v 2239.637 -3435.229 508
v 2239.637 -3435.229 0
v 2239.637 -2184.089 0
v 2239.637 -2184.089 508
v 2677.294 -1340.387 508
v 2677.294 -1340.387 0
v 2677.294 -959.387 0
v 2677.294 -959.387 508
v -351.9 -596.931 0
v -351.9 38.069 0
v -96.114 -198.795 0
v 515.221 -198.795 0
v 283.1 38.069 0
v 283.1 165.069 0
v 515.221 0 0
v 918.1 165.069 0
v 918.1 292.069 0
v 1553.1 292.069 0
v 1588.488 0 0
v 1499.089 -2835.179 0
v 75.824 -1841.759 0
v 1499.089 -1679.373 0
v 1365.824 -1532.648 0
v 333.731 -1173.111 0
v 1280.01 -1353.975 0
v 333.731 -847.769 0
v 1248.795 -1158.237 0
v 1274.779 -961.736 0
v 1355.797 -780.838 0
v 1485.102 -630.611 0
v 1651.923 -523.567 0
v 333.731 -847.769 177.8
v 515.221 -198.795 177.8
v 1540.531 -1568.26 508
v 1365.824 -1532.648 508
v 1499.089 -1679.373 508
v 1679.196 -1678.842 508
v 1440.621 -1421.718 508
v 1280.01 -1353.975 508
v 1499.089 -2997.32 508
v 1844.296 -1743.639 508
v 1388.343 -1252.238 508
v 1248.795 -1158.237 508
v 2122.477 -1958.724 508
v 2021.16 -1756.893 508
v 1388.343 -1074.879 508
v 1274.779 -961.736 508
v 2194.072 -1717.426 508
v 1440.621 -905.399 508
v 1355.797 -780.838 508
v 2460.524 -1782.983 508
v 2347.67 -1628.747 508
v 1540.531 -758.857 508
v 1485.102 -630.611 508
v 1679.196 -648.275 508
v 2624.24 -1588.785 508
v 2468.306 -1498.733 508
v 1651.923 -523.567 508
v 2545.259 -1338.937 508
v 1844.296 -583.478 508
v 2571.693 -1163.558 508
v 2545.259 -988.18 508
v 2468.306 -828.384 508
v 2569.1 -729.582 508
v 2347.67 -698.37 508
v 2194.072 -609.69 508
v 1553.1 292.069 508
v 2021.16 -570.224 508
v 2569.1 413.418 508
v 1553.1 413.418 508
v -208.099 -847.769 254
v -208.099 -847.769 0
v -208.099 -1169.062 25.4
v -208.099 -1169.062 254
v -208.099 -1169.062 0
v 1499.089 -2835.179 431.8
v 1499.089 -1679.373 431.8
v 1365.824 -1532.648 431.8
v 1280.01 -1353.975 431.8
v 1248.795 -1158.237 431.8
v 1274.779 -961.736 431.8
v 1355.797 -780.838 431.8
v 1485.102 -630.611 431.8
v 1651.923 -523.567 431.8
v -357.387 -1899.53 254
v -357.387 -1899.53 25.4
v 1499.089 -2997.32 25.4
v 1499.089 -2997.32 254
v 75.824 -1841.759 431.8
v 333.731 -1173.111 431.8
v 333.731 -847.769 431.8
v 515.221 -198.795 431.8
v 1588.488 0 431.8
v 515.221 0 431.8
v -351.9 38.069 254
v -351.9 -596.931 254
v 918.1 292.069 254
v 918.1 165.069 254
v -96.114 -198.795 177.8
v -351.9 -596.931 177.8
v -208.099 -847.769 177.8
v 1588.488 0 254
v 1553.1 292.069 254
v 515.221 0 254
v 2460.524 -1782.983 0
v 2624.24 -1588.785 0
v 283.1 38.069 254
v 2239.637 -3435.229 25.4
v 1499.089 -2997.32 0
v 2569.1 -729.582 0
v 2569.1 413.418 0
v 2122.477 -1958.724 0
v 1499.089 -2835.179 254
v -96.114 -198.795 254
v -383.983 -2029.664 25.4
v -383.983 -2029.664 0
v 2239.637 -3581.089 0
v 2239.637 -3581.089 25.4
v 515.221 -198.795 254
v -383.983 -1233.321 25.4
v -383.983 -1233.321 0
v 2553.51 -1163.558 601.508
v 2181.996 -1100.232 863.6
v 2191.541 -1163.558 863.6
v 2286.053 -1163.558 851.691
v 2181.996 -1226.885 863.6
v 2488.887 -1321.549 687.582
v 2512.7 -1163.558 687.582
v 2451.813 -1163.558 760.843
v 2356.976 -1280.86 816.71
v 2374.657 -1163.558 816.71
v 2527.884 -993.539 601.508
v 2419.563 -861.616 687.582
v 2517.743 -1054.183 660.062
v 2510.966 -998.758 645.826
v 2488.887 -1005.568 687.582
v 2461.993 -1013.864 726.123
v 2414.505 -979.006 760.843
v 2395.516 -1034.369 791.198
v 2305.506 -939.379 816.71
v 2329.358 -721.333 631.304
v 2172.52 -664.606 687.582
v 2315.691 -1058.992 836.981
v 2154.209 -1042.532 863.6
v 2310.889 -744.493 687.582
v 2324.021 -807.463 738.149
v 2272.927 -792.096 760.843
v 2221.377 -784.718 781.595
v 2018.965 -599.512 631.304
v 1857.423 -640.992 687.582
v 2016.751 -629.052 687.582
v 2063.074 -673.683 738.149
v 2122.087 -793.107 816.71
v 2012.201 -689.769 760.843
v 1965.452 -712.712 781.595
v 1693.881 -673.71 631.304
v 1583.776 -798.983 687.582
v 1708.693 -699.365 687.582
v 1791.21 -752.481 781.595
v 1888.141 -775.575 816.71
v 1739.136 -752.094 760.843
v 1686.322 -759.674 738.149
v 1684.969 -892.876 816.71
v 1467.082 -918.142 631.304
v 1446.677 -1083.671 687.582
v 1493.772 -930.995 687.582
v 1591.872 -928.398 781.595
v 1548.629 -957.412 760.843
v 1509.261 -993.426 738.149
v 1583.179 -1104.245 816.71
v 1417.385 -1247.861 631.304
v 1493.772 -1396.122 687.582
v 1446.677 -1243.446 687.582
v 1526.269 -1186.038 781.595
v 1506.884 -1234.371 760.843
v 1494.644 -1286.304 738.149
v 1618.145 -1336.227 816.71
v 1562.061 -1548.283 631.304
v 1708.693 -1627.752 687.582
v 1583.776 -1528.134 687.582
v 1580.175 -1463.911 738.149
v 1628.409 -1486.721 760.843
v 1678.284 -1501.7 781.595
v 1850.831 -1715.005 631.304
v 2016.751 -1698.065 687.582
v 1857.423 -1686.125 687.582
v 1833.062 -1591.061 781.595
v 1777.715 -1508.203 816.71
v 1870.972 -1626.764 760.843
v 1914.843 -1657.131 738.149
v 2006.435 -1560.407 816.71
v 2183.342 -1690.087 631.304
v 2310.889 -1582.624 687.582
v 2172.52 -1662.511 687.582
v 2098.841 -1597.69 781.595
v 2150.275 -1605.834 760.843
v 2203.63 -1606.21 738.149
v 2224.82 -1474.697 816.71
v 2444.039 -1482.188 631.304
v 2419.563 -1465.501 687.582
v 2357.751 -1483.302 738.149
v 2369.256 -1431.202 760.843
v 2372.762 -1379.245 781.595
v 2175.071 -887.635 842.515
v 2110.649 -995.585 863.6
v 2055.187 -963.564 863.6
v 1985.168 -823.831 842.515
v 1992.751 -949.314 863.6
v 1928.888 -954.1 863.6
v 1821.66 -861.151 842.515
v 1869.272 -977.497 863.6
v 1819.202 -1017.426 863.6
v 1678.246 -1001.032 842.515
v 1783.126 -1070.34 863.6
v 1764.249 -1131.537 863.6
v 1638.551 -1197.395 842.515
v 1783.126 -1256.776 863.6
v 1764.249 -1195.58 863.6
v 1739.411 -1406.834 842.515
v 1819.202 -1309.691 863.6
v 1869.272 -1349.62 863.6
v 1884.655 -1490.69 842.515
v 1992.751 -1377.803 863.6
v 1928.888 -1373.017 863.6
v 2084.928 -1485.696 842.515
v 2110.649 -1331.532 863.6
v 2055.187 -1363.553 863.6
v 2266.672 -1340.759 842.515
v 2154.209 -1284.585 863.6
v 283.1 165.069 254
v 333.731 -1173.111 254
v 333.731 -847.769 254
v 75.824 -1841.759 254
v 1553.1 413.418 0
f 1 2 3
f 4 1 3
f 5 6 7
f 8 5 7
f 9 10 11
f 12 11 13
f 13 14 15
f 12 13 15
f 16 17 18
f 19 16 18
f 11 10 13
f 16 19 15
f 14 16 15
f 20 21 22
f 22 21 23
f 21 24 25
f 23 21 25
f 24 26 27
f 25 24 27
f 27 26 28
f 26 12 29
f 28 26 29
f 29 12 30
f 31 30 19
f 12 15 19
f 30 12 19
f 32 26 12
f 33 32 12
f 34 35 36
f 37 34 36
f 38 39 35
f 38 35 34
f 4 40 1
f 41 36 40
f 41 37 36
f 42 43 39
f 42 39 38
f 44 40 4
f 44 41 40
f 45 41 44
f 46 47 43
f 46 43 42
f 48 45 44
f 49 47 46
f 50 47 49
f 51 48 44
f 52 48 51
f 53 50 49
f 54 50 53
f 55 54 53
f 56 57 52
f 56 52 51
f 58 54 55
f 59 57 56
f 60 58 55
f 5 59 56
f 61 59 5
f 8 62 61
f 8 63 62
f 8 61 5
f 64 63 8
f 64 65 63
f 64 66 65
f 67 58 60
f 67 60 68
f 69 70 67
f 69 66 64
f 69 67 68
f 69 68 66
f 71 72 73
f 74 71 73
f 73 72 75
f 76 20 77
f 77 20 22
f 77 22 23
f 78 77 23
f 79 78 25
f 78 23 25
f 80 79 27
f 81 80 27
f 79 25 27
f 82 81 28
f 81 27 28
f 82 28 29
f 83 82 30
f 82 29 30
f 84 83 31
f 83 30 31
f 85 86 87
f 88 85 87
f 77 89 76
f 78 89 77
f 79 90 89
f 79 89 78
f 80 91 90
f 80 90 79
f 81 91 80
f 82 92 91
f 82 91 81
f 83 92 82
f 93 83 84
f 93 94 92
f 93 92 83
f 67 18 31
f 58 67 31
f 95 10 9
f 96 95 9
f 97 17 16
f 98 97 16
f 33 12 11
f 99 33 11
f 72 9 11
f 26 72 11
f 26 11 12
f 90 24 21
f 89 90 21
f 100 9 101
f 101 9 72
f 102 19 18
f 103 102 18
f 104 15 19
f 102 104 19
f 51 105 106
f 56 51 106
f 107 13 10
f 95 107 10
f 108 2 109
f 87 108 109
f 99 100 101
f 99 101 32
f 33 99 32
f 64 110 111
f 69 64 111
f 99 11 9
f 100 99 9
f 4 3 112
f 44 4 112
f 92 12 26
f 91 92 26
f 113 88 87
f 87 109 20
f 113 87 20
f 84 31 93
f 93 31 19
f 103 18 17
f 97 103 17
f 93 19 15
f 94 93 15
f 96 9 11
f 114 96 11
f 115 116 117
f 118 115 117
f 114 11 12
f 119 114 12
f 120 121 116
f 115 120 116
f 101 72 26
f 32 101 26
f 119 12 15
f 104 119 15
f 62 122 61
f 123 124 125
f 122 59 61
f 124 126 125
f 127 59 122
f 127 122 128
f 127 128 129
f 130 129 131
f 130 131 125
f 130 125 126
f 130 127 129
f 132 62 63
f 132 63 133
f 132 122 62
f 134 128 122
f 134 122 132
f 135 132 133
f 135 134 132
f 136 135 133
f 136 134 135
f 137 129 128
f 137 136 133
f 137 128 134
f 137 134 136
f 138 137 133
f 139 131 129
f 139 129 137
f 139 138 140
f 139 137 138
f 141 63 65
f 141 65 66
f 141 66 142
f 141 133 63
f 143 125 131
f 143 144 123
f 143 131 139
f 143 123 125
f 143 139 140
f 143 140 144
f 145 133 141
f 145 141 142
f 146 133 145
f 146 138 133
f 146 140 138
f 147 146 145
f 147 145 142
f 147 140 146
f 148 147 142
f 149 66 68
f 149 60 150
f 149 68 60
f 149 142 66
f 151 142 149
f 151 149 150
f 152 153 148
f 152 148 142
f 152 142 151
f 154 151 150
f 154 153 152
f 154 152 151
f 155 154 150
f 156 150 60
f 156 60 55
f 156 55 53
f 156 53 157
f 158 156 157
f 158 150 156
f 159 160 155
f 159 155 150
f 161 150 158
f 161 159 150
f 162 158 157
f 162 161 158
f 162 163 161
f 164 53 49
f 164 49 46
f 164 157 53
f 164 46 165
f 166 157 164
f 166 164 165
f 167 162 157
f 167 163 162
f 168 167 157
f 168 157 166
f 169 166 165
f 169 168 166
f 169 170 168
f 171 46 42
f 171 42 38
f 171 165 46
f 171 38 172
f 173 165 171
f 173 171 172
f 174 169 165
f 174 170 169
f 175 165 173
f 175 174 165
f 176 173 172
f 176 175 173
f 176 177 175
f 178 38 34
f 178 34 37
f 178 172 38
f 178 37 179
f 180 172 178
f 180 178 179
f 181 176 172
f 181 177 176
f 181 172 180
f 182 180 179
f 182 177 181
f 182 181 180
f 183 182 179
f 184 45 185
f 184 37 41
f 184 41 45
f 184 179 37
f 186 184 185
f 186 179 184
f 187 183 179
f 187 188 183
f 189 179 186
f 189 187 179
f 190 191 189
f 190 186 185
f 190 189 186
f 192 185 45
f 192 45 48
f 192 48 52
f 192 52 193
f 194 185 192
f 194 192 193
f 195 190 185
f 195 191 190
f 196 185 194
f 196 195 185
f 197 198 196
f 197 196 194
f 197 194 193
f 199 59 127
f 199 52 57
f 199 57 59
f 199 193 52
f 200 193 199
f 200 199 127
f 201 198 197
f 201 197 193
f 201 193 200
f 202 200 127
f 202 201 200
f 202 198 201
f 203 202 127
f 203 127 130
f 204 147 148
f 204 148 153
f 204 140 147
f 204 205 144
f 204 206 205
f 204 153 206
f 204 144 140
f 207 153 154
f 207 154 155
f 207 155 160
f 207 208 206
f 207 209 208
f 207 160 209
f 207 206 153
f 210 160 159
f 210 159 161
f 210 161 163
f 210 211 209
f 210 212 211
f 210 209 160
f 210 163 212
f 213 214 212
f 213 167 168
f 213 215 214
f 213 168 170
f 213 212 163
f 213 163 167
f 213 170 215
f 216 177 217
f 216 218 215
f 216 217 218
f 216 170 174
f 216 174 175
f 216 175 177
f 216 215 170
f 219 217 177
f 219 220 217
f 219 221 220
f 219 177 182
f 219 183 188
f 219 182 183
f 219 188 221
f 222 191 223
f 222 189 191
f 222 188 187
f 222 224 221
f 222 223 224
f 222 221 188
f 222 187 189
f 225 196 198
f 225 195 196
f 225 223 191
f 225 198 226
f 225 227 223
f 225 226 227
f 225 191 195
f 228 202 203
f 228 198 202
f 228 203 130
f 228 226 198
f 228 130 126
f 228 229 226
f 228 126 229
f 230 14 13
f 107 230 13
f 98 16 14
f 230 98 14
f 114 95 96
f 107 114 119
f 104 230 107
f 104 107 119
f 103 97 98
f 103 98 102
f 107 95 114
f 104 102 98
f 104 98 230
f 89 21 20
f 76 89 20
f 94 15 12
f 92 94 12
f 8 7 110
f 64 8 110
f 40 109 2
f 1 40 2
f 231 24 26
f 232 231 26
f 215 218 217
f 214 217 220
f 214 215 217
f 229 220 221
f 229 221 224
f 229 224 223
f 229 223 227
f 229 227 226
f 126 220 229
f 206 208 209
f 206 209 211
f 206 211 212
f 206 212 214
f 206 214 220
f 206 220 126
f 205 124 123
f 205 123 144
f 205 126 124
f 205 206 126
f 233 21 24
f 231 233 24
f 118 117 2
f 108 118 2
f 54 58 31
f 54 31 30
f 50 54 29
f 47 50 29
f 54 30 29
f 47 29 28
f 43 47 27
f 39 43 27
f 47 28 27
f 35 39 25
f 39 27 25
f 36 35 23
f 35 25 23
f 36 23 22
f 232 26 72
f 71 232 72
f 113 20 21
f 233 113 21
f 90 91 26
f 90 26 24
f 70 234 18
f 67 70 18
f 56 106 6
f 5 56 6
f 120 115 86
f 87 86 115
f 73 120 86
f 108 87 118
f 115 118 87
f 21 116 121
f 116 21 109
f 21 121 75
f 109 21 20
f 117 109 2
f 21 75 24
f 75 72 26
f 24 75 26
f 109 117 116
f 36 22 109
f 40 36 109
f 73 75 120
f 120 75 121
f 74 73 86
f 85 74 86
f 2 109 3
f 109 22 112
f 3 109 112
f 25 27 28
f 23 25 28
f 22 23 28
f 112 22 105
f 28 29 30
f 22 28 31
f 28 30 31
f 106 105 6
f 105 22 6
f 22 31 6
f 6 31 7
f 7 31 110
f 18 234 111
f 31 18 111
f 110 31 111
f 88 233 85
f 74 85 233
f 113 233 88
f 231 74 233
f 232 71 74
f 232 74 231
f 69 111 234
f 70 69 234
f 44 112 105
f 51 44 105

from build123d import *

# Parameters (mm, degrees)
F1_DEPTH = 25.4
F2_DEPTH = 254
F3_DEPTH = 177.8
F4_DEPTH = 431.8
F0_R     = 594.9979970548
F5_DEPTH = 508
F6_DEPTH = 863.6


# Not quite as in the source:
# - a fillet or chamfer that OpenCascade refuses, or shapes differently, is made with other operations: its cross-section is extruded or revolved along the edge and cut away or added


with BuildPart() as f1:
    # F0 (on Top) → F1 (new body)
    with BuildSketch(Plane.XY):
        Polygon((2239.6372437481, -3435.2285861969), (1499.0893602371, -2997.3202280322), (1499.0893602371, -3143.1810455656), (2239.6372437481, -3581.0894037303), align=None)
        Polygon((-357.3869134164, -1899.5296663834), (-208.0992609262, -1169.0624952316), (-383.9827477932, -1233.3211898804), (-383.9827477932, -2029.6635627747), align=None)
        Polygon((1499.0893602371, -2997.3202280322), (-357.3869134164, -1899.5296663834), (-383.9827477932, -2029.6635627747), (1499.0893602371, -3143.1810455656), align=None)
    extrude(amount=F1_DEPTH)

    # F0 (on Top) → F2 (join)
    with BuildSketch(Plane.XY):
        Polygon((333.7312042713, -847.7689027786), (-208.0992609262, -847.7689027786), (-208.0992609262, -1169.0624952316), (-357.3869134164, -1899.5296663834), (1499.0893602371, -2997.3202280322), (1499.0893602371, -2835.1788520813), (75.824059546, -1841.7588472366), (333.7312042713, -1173.1106042862), align=None)
    extrude(amount=F2_DEPTH)


with BuildPart() as f2:
    # F0 (on Top) → F2, piece 2 (new body)
    with BuildSketch(Plane.XY):
        Polygon((283.1003940614, 38.0688405037), (-351.8996059386, 38.0688405037), (-351.8996059386, -596.9311594963), (-96.1140394211, -198.7948268652), (515.2214169502, -198.7948268652), (515.2214169502, 0), (1588.4876312045, 0), (1553.1003940614, 292.0688405037), (918.1003940614, 292.0688405037), (918.1003940614, 165.0688405037), (283.1003940614, 165.0688405037), align=None)
    extrude(amount=F2_DEPTH)


with BuildPart() as f3:
    # F0 (on Top) → F3 (new body)
    with BuildSketch(Plane.XY):
        Polygon((-96.1140394211, -198.7948268652), (-351.8996059386, -596.9311594963), (-208.0992609262, -847.7689027786), (333.7312042713, -847.7689027786), (515.2214169502, -198.7948268652), align=None)
    extrude(amount=F3_DEPTH)


with BuildPart() as f4:
    # F0 (on Top) → F4 (new body)
    with BuildSketch(Plane.XY):
        with BuildLine():
            Line((515.2214169502, -198.7948268652), (333.7312042713, -847.7689027786))
            Line((333.7312042713, -847.7689027786), (333.7312042713, -1173.1106042862))
            Line((333.7312042713, -1173.1106042862), (75.824059546, -1841.7588472366))
            Line((75.824059546, -1841.7588472366), (1499.0893602371, -2835.1788520813))
            Line((1499.0893602371, -2835.1788520813), (1499.0893602371, -1679.3727874756))
            ThreePointArc((1499.0893602371, -1679.3727874756), (1254.6606819019, -1059.0438901467), (1651.9232988358, -523.5667824745))
            Line((1651.9232988358, -523.5667824745), (1588.4876312045, 0))
            Line((1588.4876312045, 0), (515.2214169502, 0))
            Line((515.2214169502, 0), (515.2214169502, -198.7948268652))
        make_face()
    extrude(amount=F4_DEPTH)


with BuildPart() as f5:
    # F0 (on Top) → F5 (new body)
    with BuildSketch(Plane.XY):
        with BuildLine():
            Line((1553.1003940614, 413.4177421996), (1553.1003940614, 292.0688405037))
            Line((1553.1003940614, 292.0688405037), (1588.4876312045, 0))
            Line((1588.4876312045, 0), (1651.9232988358, -523.5667824745))
            ThreePointArc((1651.9232988358, -523.5667824745), (1254.6606819019, -1059.0438901467), (1499.0893602371, -1679.3727874756))
            Line((1499.0893602371, -1679.3727874756), (1499.0893602371, -2835.1788520813))
            Line((1499.0893602371, -2835.1788520813), (1499.0893602371, -2997.3202280322))
            Line((1499.0893602371, -2997.3202280322), (2239.6372437481, -3435.2285861969))
            Line((2239.6372437481, -3435.2285861969), (2239.6372437481, -2184.0894037303))
            Line((2239.6372437481, -2184.0894037303), (2122.4766519932, -1958.7243759651))
            Line((2122.4766519932, -1958.7243759651), (2460.5241936411, -1782.9834883327))
            Line((2460.5241936411, -1782.9834883327), (2624.2396669257, -1588.7845083992))
            Line((2624.2396669257, -1588.7845083992), (2677.2935103517, -1340.3870653815))
            Line((2677.2935103517, -1340.3870653815), (2677.2935103517, -959.3870653815))
            Line((2677.2935103517, -959.3870653815), (2569.1003940614, -729.5822578004))
            Line((2569.1003940614, -729.5822578004), (2569.1003940614, 413.4177421996))
            Line((2569.1003940614, 413.4177421996), (1553.1003940614, 413.4177421996))
        make_face()
        with Locations((1976.6952991486, -1163.5584831238)):
            Circle(F0_R, mode=Mode.SUBTRACT)
    extrude(amount=F5_DEPTH)

    # F0 (on Top) → F6 (join)
    with BuildSketch(Plane.XY):
        with Locations((1976.6952991486, -1163.5584831238)):
            Circle(F0_R)
    extrude(amount=F6_DEPTH)

    # F7: fillet of radius 381 on 1 edges, made by hand

    # F7_s1 → F7_t2 (revolve, cut)
    with BuildSketch(Plane.XZ.offset(1163.5584831238)):
        with BuildLine():
            ThreePointArc((2571.6932962034, 508), (2451.8134551625, 760.8430592126), (2191.5409057072, 863.6))
            Line((2191.5409057072, 863.6), (2571.6932962034, 863.6))
            Line((2571.6932962034, 863.6), (2571.6932962034, 508))
        make_face()
    revolve(axis=Axis((1976.6952991486, -1163.5584831238, 863.6), (0, 0, 1)), mode=Mode.SUBTRACT)


solid = Compound([f1.part, f2.part, f3.part, f4.part, f5.part])
